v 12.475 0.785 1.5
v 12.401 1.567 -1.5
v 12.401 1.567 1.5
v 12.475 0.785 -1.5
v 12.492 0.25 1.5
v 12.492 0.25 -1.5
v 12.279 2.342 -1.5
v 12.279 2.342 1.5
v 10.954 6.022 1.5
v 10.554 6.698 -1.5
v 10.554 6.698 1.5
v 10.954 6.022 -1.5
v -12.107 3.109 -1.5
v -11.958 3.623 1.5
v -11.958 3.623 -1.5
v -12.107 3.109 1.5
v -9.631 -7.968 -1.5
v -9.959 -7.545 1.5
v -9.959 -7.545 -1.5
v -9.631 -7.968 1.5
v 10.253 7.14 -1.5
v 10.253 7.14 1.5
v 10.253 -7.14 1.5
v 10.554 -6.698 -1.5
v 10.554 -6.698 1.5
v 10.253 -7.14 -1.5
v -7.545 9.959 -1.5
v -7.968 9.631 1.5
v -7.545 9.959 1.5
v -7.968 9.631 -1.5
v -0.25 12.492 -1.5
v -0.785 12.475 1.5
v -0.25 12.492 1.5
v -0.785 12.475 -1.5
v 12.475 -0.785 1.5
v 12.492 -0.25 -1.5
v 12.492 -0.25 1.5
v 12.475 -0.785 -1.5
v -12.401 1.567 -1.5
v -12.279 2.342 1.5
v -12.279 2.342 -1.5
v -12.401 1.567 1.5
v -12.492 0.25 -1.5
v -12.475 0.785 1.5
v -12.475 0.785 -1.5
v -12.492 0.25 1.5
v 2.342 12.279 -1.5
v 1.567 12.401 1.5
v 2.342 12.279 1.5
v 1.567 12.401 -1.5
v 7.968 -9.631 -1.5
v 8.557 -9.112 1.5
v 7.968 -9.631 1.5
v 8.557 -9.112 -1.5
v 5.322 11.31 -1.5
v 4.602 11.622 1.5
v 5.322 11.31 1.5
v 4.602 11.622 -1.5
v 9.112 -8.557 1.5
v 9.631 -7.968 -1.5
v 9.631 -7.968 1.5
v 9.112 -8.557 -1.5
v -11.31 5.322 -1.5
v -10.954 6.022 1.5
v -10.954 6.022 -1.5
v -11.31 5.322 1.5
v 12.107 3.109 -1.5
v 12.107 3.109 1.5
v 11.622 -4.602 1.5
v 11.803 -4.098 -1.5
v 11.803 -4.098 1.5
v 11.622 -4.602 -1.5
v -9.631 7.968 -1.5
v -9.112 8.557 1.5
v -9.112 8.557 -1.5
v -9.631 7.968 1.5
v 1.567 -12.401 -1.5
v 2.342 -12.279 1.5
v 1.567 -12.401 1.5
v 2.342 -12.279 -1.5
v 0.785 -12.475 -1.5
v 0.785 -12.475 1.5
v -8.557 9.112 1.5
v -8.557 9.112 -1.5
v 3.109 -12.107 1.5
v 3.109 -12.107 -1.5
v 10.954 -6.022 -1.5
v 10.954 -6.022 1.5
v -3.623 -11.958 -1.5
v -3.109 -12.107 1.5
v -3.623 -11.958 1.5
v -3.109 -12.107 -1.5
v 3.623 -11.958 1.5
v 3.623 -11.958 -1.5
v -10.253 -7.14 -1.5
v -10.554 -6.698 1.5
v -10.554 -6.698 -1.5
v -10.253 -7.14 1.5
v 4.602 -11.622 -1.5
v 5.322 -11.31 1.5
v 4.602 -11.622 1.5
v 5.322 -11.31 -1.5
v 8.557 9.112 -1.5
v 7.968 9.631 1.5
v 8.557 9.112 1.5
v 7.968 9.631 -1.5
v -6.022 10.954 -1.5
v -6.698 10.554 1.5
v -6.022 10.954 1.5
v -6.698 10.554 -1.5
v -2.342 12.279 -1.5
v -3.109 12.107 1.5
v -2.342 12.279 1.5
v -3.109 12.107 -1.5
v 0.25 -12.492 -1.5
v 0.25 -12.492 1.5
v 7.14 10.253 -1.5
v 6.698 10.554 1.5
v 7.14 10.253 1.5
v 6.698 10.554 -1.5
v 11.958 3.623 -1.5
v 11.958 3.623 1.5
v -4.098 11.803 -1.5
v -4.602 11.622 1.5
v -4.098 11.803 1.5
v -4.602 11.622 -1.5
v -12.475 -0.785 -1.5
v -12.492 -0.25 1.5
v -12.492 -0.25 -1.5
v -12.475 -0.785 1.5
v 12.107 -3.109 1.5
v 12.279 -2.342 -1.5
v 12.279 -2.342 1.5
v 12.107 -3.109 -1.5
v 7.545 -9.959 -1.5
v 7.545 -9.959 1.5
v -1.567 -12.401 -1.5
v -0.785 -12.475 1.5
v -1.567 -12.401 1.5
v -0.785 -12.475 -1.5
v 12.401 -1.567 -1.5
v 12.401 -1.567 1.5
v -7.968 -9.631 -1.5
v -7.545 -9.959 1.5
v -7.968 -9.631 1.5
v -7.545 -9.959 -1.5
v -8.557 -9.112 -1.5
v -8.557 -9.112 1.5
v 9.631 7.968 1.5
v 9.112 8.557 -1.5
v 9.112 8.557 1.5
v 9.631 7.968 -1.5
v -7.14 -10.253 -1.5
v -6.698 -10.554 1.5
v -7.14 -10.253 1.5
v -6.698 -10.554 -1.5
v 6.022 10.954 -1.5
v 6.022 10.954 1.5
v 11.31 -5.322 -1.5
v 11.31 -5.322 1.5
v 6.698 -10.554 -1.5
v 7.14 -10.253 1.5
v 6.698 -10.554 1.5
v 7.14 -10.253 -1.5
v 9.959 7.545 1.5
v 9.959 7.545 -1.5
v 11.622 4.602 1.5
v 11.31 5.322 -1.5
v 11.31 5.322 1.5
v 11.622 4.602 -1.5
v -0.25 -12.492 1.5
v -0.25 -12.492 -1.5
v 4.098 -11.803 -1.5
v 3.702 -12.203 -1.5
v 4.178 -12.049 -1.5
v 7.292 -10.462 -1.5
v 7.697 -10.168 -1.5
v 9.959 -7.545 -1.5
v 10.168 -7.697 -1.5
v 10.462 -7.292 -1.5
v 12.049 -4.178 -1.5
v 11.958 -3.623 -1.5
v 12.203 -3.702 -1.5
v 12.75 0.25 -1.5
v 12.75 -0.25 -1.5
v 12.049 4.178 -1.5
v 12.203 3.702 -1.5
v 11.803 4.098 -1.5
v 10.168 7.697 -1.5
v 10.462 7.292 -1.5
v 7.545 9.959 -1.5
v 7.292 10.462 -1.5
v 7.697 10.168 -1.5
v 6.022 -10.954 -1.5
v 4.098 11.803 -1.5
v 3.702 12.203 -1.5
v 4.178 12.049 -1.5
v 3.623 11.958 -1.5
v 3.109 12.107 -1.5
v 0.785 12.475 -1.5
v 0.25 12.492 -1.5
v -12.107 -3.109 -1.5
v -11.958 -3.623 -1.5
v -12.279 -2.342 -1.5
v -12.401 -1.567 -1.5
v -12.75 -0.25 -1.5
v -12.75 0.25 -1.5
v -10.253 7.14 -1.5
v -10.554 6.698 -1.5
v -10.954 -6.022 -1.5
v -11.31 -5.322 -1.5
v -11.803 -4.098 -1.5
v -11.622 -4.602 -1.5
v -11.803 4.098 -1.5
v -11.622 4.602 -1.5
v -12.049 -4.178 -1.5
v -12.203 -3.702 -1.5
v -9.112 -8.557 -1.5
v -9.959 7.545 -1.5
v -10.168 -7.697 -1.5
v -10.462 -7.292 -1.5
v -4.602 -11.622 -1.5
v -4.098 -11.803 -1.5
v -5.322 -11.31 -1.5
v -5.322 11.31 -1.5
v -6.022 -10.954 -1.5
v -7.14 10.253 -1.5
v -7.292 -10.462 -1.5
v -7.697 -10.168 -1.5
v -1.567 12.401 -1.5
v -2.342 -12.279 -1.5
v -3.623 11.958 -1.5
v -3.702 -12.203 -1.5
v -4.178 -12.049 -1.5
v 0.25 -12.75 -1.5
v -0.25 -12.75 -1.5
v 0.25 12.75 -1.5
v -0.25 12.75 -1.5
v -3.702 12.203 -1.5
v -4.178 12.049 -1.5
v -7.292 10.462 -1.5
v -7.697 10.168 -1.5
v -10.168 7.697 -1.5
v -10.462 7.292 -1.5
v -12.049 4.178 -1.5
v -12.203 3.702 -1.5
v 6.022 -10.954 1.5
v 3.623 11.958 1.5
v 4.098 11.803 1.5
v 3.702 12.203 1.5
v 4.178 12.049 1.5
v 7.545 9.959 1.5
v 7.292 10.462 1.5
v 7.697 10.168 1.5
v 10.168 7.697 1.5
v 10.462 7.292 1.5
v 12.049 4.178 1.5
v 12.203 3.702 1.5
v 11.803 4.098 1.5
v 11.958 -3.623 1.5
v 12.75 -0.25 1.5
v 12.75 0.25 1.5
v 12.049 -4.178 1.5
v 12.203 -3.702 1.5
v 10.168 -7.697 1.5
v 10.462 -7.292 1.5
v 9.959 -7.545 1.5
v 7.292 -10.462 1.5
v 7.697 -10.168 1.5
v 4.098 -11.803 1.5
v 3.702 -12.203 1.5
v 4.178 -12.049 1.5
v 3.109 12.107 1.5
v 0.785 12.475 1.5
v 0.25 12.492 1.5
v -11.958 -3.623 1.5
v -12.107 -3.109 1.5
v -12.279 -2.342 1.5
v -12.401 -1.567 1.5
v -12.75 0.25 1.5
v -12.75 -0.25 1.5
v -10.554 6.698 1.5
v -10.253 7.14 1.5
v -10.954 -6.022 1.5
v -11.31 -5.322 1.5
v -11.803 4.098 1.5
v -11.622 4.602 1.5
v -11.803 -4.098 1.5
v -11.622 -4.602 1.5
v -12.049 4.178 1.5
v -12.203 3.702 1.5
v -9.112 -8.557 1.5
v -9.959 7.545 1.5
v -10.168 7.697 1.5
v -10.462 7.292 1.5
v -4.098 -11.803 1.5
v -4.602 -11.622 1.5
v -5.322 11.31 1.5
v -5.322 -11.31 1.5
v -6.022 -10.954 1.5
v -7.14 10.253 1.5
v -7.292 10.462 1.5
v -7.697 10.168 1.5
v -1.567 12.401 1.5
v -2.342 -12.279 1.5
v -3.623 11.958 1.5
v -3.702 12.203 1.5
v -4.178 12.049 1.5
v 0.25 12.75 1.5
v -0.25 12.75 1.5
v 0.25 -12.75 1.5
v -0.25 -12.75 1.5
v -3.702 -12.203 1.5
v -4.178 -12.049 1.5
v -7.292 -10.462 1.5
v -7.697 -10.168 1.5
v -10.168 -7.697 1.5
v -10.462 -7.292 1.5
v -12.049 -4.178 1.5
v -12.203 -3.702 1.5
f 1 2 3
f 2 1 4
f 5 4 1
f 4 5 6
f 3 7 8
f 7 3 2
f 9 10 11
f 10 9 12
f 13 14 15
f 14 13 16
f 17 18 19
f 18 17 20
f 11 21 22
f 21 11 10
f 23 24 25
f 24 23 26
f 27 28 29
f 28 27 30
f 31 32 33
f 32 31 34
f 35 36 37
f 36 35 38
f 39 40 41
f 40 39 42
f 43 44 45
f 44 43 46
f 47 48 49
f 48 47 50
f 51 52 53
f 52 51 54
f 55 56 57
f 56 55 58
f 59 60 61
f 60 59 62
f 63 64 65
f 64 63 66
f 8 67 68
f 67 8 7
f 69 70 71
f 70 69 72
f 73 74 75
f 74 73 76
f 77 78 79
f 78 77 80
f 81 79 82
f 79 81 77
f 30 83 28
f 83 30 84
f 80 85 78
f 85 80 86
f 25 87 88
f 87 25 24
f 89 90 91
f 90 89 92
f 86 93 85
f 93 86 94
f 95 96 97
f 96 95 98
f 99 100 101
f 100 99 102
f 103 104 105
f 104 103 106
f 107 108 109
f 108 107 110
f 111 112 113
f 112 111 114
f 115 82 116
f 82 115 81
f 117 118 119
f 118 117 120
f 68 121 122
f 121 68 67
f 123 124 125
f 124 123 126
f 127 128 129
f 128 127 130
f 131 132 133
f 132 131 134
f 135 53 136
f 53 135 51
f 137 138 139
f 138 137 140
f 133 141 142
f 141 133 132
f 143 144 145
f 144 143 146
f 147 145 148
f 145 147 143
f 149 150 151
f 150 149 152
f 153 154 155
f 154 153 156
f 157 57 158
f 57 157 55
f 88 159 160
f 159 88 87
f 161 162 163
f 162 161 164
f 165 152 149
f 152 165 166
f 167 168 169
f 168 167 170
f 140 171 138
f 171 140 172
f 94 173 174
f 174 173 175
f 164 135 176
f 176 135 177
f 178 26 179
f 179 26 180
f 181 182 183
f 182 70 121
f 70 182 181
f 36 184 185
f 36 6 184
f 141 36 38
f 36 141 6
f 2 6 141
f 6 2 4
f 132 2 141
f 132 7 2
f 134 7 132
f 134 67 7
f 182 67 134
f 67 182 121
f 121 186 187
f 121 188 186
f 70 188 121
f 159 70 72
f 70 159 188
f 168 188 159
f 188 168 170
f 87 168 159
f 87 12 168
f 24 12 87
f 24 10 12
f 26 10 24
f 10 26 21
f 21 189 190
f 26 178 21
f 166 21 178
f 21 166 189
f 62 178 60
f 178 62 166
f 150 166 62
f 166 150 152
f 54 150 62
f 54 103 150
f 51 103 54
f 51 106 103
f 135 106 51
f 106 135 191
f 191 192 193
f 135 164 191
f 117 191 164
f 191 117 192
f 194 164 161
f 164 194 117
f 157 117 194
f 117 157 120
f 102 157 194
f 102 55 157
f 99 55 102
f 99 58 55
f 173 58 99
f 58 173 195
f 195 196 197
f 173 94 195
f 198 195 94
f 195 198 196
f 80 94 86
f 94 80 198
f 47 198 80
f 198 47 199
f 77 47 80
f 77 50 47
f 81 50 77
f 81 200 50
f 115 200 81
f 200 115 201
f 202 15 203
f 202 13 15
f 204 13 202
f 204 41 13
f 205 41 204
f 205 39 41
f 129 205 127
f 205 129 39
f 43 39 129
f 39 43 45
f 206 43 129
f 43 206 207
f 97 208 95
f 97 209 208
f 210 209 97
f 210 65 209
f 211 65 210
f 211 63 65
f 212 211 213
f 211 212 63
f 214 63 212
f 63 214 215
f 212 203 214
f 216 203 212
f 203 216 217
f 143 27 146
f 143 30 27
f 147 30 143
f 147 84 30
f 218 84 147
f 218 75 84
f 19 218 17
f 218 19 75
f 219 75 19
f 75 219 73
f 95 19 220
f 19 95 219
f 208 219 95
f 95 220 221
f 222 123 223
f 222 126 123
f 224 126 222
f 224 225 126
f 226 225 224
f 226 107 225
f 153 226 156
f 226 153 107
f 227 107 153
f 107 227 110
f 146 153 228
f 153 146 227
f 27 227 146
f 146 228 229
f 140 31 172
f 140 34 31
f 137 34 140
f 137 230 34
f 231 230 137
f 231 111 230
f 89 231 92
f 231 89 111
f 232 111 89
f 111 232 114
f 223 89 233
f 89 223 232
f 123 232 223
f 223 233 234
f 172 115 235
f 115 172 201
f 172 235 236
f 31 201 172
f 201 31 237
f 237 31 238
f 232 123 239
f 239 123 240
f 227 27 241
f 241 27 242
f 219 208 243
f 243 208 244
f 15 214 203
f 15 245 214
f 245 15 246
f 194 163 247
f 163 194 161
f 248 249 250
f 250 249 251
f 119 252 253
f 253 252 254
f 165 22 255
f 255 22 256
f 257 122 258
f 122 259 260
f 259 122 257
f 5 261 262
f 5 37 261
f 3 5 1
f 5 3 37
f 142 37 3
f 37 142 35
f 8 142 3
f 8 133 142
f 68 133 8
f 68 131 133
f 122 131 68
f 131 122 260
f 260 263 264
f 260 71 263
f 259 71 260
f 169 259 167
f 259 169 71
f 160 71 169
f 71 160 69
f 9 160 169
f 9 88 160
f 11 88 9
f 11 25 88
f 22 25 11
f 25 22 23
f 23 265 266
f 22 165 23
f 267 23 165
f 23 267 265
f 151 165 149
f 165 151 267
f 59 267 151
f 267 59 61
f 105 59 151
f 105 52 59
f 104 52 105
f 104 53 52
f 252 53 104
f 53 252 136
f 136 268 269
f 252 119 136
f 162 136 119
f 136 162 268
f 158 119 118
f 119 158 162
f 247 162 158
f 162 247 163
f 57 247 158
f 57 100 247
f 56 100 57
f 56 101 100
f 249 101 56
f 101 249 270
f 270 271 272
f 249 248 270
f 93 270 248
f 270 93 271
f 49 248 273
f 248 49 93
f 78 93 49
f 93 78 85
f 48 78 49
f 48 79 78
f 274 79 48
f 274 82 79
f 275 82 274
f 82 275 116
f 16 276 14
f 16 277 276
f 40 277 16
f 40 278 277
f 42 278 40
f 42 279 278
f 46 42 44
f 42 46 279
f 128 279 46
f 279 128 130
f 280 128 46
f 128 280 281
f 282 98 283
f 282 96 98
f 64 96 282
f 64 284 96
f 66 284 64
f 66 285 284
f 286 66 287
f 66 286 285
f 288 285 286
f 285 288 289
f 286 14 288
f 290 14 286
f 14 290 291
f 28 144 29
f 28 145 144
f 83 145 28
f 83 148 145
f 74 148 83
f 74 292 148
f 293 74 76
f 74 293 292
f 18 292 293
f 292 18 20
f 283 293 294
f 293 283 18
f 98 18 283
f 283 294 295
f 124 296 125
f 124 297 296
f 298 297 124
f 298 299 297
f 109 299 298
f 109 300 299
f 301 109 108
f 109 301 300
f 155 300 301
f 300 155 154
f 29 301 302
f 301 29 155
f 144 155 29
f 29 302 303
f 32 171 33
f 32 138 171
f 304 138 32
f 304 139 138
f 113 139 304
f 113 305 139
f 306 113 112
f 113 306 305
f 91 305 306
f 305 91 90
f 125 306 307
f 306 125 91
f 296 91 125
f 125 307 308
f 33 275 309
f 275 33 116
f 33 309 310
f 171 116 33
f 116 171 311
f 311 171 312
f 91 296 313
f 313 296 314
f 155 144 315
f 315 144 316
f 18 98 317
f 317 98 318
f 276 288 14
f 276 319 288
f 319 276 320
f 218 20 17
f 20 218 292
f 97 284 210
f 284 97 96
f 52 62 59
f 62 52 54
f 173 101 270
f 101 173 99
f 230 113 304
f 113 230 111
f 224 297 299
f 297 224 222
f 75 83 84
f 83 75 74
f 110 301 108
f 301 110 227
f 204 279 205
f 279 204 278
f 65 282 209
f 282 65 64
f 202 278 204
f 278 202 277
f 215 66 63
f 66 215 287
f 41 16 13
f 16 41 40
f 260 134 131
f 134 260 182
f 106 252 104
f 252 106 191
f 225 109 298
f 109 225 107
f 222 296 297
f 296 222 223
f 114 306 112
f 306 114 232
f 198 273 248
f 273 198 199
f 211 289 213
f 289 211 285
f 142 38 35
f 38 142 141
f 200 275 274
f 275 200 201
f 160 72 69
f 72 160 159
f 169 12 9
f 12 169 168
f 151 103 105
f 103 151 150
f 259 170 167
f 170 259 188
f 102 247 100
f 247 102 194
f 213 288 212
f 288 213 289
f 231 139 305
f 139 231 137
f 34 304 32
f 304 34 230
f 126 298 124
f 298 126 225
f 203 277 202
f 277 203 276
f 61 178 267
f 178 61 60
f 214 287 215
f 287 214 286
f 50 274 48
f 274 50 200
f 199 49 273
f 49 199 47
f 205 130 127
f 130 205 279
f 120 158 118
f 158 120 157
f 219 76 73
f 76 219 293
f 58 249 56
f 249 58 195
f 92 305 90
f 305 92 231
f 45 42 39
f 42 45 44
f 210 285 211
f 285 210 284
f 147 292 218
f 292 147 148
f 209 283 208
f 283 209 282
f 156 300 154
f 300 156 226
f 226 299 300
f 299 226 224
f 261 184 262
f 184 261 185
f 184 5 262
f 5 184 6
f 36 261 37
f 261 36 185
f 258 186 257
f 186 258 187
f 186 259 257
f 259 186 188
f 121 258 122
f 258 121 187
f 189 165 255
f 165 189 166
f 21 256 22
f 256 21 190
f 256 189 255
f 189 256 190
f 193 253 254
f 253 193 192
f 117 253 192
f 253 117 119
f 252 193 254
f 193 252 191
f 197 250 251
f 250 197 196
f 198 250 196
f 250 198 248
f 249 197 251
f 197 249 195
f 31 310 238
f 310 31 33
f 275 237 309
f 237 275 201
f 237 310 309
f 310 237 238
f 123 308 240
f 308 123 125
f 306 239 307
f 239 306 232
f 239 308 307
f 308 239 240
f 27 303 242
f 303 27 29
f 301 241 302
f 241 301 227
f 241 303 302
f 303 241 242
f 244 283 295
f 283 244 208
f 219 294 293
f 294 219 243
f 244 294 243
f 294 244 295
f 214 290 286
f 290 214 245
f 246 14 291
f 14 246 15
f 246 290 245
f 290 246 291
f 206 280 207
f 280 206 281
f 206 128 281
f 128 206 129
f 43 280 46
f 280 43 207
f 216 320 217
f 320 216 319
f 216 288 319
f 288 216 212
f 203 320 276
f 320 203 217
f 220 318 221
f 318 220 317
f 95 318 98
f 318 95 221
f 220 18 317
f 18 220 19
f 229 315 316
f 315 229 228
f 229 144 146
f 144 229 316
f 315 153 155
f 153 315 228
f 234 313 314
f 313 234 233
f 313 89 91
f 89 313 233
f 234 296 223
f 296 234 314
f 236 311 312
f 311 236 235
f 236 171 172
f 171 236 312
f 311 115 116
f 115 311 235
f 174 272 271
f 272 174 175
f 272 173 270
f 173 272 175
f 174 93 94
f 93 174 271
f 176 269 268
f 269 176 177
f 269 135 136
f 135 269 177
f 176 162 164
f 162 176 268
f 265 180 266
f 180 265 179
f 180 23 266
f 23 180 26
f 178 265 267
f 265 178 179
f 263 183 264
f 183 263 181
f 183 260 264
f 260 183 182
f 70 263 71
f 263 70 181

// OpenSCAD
// Simple 3D Printable Coin
// Diameter: 25mm, Thickness: 3mm

$fn = 100; // Smooth circles

module coin() {
    difference() {
        // Main coin body
        cylinder(h = 3, d = 25, center = true);
        
        // Top text (embossed)
        translate([0, 0, 2.5])
            linear_extrude(height = 1)
                text("COIN", size = 5, halign = "center", valign = "center", font = "Liberation Sans:style=Bold");
        
        // Bottom value (embossed)
        translate([0, 0, -3.5])
            rotate([180, 0, 0])
                linear_extrude(height = 1)
                    text("1", size = 8, halign = "center", valign = "center", font = "Liberation Sans:style=Bold");
    }
    
    // Edge ridges
    for (i = [0:20]) {
        rotate([0, 0, i * 18])
            translate([12.5, 0, 0])
                cube([0.5, 0.5, 3], center = true);
    }
}

coin();
